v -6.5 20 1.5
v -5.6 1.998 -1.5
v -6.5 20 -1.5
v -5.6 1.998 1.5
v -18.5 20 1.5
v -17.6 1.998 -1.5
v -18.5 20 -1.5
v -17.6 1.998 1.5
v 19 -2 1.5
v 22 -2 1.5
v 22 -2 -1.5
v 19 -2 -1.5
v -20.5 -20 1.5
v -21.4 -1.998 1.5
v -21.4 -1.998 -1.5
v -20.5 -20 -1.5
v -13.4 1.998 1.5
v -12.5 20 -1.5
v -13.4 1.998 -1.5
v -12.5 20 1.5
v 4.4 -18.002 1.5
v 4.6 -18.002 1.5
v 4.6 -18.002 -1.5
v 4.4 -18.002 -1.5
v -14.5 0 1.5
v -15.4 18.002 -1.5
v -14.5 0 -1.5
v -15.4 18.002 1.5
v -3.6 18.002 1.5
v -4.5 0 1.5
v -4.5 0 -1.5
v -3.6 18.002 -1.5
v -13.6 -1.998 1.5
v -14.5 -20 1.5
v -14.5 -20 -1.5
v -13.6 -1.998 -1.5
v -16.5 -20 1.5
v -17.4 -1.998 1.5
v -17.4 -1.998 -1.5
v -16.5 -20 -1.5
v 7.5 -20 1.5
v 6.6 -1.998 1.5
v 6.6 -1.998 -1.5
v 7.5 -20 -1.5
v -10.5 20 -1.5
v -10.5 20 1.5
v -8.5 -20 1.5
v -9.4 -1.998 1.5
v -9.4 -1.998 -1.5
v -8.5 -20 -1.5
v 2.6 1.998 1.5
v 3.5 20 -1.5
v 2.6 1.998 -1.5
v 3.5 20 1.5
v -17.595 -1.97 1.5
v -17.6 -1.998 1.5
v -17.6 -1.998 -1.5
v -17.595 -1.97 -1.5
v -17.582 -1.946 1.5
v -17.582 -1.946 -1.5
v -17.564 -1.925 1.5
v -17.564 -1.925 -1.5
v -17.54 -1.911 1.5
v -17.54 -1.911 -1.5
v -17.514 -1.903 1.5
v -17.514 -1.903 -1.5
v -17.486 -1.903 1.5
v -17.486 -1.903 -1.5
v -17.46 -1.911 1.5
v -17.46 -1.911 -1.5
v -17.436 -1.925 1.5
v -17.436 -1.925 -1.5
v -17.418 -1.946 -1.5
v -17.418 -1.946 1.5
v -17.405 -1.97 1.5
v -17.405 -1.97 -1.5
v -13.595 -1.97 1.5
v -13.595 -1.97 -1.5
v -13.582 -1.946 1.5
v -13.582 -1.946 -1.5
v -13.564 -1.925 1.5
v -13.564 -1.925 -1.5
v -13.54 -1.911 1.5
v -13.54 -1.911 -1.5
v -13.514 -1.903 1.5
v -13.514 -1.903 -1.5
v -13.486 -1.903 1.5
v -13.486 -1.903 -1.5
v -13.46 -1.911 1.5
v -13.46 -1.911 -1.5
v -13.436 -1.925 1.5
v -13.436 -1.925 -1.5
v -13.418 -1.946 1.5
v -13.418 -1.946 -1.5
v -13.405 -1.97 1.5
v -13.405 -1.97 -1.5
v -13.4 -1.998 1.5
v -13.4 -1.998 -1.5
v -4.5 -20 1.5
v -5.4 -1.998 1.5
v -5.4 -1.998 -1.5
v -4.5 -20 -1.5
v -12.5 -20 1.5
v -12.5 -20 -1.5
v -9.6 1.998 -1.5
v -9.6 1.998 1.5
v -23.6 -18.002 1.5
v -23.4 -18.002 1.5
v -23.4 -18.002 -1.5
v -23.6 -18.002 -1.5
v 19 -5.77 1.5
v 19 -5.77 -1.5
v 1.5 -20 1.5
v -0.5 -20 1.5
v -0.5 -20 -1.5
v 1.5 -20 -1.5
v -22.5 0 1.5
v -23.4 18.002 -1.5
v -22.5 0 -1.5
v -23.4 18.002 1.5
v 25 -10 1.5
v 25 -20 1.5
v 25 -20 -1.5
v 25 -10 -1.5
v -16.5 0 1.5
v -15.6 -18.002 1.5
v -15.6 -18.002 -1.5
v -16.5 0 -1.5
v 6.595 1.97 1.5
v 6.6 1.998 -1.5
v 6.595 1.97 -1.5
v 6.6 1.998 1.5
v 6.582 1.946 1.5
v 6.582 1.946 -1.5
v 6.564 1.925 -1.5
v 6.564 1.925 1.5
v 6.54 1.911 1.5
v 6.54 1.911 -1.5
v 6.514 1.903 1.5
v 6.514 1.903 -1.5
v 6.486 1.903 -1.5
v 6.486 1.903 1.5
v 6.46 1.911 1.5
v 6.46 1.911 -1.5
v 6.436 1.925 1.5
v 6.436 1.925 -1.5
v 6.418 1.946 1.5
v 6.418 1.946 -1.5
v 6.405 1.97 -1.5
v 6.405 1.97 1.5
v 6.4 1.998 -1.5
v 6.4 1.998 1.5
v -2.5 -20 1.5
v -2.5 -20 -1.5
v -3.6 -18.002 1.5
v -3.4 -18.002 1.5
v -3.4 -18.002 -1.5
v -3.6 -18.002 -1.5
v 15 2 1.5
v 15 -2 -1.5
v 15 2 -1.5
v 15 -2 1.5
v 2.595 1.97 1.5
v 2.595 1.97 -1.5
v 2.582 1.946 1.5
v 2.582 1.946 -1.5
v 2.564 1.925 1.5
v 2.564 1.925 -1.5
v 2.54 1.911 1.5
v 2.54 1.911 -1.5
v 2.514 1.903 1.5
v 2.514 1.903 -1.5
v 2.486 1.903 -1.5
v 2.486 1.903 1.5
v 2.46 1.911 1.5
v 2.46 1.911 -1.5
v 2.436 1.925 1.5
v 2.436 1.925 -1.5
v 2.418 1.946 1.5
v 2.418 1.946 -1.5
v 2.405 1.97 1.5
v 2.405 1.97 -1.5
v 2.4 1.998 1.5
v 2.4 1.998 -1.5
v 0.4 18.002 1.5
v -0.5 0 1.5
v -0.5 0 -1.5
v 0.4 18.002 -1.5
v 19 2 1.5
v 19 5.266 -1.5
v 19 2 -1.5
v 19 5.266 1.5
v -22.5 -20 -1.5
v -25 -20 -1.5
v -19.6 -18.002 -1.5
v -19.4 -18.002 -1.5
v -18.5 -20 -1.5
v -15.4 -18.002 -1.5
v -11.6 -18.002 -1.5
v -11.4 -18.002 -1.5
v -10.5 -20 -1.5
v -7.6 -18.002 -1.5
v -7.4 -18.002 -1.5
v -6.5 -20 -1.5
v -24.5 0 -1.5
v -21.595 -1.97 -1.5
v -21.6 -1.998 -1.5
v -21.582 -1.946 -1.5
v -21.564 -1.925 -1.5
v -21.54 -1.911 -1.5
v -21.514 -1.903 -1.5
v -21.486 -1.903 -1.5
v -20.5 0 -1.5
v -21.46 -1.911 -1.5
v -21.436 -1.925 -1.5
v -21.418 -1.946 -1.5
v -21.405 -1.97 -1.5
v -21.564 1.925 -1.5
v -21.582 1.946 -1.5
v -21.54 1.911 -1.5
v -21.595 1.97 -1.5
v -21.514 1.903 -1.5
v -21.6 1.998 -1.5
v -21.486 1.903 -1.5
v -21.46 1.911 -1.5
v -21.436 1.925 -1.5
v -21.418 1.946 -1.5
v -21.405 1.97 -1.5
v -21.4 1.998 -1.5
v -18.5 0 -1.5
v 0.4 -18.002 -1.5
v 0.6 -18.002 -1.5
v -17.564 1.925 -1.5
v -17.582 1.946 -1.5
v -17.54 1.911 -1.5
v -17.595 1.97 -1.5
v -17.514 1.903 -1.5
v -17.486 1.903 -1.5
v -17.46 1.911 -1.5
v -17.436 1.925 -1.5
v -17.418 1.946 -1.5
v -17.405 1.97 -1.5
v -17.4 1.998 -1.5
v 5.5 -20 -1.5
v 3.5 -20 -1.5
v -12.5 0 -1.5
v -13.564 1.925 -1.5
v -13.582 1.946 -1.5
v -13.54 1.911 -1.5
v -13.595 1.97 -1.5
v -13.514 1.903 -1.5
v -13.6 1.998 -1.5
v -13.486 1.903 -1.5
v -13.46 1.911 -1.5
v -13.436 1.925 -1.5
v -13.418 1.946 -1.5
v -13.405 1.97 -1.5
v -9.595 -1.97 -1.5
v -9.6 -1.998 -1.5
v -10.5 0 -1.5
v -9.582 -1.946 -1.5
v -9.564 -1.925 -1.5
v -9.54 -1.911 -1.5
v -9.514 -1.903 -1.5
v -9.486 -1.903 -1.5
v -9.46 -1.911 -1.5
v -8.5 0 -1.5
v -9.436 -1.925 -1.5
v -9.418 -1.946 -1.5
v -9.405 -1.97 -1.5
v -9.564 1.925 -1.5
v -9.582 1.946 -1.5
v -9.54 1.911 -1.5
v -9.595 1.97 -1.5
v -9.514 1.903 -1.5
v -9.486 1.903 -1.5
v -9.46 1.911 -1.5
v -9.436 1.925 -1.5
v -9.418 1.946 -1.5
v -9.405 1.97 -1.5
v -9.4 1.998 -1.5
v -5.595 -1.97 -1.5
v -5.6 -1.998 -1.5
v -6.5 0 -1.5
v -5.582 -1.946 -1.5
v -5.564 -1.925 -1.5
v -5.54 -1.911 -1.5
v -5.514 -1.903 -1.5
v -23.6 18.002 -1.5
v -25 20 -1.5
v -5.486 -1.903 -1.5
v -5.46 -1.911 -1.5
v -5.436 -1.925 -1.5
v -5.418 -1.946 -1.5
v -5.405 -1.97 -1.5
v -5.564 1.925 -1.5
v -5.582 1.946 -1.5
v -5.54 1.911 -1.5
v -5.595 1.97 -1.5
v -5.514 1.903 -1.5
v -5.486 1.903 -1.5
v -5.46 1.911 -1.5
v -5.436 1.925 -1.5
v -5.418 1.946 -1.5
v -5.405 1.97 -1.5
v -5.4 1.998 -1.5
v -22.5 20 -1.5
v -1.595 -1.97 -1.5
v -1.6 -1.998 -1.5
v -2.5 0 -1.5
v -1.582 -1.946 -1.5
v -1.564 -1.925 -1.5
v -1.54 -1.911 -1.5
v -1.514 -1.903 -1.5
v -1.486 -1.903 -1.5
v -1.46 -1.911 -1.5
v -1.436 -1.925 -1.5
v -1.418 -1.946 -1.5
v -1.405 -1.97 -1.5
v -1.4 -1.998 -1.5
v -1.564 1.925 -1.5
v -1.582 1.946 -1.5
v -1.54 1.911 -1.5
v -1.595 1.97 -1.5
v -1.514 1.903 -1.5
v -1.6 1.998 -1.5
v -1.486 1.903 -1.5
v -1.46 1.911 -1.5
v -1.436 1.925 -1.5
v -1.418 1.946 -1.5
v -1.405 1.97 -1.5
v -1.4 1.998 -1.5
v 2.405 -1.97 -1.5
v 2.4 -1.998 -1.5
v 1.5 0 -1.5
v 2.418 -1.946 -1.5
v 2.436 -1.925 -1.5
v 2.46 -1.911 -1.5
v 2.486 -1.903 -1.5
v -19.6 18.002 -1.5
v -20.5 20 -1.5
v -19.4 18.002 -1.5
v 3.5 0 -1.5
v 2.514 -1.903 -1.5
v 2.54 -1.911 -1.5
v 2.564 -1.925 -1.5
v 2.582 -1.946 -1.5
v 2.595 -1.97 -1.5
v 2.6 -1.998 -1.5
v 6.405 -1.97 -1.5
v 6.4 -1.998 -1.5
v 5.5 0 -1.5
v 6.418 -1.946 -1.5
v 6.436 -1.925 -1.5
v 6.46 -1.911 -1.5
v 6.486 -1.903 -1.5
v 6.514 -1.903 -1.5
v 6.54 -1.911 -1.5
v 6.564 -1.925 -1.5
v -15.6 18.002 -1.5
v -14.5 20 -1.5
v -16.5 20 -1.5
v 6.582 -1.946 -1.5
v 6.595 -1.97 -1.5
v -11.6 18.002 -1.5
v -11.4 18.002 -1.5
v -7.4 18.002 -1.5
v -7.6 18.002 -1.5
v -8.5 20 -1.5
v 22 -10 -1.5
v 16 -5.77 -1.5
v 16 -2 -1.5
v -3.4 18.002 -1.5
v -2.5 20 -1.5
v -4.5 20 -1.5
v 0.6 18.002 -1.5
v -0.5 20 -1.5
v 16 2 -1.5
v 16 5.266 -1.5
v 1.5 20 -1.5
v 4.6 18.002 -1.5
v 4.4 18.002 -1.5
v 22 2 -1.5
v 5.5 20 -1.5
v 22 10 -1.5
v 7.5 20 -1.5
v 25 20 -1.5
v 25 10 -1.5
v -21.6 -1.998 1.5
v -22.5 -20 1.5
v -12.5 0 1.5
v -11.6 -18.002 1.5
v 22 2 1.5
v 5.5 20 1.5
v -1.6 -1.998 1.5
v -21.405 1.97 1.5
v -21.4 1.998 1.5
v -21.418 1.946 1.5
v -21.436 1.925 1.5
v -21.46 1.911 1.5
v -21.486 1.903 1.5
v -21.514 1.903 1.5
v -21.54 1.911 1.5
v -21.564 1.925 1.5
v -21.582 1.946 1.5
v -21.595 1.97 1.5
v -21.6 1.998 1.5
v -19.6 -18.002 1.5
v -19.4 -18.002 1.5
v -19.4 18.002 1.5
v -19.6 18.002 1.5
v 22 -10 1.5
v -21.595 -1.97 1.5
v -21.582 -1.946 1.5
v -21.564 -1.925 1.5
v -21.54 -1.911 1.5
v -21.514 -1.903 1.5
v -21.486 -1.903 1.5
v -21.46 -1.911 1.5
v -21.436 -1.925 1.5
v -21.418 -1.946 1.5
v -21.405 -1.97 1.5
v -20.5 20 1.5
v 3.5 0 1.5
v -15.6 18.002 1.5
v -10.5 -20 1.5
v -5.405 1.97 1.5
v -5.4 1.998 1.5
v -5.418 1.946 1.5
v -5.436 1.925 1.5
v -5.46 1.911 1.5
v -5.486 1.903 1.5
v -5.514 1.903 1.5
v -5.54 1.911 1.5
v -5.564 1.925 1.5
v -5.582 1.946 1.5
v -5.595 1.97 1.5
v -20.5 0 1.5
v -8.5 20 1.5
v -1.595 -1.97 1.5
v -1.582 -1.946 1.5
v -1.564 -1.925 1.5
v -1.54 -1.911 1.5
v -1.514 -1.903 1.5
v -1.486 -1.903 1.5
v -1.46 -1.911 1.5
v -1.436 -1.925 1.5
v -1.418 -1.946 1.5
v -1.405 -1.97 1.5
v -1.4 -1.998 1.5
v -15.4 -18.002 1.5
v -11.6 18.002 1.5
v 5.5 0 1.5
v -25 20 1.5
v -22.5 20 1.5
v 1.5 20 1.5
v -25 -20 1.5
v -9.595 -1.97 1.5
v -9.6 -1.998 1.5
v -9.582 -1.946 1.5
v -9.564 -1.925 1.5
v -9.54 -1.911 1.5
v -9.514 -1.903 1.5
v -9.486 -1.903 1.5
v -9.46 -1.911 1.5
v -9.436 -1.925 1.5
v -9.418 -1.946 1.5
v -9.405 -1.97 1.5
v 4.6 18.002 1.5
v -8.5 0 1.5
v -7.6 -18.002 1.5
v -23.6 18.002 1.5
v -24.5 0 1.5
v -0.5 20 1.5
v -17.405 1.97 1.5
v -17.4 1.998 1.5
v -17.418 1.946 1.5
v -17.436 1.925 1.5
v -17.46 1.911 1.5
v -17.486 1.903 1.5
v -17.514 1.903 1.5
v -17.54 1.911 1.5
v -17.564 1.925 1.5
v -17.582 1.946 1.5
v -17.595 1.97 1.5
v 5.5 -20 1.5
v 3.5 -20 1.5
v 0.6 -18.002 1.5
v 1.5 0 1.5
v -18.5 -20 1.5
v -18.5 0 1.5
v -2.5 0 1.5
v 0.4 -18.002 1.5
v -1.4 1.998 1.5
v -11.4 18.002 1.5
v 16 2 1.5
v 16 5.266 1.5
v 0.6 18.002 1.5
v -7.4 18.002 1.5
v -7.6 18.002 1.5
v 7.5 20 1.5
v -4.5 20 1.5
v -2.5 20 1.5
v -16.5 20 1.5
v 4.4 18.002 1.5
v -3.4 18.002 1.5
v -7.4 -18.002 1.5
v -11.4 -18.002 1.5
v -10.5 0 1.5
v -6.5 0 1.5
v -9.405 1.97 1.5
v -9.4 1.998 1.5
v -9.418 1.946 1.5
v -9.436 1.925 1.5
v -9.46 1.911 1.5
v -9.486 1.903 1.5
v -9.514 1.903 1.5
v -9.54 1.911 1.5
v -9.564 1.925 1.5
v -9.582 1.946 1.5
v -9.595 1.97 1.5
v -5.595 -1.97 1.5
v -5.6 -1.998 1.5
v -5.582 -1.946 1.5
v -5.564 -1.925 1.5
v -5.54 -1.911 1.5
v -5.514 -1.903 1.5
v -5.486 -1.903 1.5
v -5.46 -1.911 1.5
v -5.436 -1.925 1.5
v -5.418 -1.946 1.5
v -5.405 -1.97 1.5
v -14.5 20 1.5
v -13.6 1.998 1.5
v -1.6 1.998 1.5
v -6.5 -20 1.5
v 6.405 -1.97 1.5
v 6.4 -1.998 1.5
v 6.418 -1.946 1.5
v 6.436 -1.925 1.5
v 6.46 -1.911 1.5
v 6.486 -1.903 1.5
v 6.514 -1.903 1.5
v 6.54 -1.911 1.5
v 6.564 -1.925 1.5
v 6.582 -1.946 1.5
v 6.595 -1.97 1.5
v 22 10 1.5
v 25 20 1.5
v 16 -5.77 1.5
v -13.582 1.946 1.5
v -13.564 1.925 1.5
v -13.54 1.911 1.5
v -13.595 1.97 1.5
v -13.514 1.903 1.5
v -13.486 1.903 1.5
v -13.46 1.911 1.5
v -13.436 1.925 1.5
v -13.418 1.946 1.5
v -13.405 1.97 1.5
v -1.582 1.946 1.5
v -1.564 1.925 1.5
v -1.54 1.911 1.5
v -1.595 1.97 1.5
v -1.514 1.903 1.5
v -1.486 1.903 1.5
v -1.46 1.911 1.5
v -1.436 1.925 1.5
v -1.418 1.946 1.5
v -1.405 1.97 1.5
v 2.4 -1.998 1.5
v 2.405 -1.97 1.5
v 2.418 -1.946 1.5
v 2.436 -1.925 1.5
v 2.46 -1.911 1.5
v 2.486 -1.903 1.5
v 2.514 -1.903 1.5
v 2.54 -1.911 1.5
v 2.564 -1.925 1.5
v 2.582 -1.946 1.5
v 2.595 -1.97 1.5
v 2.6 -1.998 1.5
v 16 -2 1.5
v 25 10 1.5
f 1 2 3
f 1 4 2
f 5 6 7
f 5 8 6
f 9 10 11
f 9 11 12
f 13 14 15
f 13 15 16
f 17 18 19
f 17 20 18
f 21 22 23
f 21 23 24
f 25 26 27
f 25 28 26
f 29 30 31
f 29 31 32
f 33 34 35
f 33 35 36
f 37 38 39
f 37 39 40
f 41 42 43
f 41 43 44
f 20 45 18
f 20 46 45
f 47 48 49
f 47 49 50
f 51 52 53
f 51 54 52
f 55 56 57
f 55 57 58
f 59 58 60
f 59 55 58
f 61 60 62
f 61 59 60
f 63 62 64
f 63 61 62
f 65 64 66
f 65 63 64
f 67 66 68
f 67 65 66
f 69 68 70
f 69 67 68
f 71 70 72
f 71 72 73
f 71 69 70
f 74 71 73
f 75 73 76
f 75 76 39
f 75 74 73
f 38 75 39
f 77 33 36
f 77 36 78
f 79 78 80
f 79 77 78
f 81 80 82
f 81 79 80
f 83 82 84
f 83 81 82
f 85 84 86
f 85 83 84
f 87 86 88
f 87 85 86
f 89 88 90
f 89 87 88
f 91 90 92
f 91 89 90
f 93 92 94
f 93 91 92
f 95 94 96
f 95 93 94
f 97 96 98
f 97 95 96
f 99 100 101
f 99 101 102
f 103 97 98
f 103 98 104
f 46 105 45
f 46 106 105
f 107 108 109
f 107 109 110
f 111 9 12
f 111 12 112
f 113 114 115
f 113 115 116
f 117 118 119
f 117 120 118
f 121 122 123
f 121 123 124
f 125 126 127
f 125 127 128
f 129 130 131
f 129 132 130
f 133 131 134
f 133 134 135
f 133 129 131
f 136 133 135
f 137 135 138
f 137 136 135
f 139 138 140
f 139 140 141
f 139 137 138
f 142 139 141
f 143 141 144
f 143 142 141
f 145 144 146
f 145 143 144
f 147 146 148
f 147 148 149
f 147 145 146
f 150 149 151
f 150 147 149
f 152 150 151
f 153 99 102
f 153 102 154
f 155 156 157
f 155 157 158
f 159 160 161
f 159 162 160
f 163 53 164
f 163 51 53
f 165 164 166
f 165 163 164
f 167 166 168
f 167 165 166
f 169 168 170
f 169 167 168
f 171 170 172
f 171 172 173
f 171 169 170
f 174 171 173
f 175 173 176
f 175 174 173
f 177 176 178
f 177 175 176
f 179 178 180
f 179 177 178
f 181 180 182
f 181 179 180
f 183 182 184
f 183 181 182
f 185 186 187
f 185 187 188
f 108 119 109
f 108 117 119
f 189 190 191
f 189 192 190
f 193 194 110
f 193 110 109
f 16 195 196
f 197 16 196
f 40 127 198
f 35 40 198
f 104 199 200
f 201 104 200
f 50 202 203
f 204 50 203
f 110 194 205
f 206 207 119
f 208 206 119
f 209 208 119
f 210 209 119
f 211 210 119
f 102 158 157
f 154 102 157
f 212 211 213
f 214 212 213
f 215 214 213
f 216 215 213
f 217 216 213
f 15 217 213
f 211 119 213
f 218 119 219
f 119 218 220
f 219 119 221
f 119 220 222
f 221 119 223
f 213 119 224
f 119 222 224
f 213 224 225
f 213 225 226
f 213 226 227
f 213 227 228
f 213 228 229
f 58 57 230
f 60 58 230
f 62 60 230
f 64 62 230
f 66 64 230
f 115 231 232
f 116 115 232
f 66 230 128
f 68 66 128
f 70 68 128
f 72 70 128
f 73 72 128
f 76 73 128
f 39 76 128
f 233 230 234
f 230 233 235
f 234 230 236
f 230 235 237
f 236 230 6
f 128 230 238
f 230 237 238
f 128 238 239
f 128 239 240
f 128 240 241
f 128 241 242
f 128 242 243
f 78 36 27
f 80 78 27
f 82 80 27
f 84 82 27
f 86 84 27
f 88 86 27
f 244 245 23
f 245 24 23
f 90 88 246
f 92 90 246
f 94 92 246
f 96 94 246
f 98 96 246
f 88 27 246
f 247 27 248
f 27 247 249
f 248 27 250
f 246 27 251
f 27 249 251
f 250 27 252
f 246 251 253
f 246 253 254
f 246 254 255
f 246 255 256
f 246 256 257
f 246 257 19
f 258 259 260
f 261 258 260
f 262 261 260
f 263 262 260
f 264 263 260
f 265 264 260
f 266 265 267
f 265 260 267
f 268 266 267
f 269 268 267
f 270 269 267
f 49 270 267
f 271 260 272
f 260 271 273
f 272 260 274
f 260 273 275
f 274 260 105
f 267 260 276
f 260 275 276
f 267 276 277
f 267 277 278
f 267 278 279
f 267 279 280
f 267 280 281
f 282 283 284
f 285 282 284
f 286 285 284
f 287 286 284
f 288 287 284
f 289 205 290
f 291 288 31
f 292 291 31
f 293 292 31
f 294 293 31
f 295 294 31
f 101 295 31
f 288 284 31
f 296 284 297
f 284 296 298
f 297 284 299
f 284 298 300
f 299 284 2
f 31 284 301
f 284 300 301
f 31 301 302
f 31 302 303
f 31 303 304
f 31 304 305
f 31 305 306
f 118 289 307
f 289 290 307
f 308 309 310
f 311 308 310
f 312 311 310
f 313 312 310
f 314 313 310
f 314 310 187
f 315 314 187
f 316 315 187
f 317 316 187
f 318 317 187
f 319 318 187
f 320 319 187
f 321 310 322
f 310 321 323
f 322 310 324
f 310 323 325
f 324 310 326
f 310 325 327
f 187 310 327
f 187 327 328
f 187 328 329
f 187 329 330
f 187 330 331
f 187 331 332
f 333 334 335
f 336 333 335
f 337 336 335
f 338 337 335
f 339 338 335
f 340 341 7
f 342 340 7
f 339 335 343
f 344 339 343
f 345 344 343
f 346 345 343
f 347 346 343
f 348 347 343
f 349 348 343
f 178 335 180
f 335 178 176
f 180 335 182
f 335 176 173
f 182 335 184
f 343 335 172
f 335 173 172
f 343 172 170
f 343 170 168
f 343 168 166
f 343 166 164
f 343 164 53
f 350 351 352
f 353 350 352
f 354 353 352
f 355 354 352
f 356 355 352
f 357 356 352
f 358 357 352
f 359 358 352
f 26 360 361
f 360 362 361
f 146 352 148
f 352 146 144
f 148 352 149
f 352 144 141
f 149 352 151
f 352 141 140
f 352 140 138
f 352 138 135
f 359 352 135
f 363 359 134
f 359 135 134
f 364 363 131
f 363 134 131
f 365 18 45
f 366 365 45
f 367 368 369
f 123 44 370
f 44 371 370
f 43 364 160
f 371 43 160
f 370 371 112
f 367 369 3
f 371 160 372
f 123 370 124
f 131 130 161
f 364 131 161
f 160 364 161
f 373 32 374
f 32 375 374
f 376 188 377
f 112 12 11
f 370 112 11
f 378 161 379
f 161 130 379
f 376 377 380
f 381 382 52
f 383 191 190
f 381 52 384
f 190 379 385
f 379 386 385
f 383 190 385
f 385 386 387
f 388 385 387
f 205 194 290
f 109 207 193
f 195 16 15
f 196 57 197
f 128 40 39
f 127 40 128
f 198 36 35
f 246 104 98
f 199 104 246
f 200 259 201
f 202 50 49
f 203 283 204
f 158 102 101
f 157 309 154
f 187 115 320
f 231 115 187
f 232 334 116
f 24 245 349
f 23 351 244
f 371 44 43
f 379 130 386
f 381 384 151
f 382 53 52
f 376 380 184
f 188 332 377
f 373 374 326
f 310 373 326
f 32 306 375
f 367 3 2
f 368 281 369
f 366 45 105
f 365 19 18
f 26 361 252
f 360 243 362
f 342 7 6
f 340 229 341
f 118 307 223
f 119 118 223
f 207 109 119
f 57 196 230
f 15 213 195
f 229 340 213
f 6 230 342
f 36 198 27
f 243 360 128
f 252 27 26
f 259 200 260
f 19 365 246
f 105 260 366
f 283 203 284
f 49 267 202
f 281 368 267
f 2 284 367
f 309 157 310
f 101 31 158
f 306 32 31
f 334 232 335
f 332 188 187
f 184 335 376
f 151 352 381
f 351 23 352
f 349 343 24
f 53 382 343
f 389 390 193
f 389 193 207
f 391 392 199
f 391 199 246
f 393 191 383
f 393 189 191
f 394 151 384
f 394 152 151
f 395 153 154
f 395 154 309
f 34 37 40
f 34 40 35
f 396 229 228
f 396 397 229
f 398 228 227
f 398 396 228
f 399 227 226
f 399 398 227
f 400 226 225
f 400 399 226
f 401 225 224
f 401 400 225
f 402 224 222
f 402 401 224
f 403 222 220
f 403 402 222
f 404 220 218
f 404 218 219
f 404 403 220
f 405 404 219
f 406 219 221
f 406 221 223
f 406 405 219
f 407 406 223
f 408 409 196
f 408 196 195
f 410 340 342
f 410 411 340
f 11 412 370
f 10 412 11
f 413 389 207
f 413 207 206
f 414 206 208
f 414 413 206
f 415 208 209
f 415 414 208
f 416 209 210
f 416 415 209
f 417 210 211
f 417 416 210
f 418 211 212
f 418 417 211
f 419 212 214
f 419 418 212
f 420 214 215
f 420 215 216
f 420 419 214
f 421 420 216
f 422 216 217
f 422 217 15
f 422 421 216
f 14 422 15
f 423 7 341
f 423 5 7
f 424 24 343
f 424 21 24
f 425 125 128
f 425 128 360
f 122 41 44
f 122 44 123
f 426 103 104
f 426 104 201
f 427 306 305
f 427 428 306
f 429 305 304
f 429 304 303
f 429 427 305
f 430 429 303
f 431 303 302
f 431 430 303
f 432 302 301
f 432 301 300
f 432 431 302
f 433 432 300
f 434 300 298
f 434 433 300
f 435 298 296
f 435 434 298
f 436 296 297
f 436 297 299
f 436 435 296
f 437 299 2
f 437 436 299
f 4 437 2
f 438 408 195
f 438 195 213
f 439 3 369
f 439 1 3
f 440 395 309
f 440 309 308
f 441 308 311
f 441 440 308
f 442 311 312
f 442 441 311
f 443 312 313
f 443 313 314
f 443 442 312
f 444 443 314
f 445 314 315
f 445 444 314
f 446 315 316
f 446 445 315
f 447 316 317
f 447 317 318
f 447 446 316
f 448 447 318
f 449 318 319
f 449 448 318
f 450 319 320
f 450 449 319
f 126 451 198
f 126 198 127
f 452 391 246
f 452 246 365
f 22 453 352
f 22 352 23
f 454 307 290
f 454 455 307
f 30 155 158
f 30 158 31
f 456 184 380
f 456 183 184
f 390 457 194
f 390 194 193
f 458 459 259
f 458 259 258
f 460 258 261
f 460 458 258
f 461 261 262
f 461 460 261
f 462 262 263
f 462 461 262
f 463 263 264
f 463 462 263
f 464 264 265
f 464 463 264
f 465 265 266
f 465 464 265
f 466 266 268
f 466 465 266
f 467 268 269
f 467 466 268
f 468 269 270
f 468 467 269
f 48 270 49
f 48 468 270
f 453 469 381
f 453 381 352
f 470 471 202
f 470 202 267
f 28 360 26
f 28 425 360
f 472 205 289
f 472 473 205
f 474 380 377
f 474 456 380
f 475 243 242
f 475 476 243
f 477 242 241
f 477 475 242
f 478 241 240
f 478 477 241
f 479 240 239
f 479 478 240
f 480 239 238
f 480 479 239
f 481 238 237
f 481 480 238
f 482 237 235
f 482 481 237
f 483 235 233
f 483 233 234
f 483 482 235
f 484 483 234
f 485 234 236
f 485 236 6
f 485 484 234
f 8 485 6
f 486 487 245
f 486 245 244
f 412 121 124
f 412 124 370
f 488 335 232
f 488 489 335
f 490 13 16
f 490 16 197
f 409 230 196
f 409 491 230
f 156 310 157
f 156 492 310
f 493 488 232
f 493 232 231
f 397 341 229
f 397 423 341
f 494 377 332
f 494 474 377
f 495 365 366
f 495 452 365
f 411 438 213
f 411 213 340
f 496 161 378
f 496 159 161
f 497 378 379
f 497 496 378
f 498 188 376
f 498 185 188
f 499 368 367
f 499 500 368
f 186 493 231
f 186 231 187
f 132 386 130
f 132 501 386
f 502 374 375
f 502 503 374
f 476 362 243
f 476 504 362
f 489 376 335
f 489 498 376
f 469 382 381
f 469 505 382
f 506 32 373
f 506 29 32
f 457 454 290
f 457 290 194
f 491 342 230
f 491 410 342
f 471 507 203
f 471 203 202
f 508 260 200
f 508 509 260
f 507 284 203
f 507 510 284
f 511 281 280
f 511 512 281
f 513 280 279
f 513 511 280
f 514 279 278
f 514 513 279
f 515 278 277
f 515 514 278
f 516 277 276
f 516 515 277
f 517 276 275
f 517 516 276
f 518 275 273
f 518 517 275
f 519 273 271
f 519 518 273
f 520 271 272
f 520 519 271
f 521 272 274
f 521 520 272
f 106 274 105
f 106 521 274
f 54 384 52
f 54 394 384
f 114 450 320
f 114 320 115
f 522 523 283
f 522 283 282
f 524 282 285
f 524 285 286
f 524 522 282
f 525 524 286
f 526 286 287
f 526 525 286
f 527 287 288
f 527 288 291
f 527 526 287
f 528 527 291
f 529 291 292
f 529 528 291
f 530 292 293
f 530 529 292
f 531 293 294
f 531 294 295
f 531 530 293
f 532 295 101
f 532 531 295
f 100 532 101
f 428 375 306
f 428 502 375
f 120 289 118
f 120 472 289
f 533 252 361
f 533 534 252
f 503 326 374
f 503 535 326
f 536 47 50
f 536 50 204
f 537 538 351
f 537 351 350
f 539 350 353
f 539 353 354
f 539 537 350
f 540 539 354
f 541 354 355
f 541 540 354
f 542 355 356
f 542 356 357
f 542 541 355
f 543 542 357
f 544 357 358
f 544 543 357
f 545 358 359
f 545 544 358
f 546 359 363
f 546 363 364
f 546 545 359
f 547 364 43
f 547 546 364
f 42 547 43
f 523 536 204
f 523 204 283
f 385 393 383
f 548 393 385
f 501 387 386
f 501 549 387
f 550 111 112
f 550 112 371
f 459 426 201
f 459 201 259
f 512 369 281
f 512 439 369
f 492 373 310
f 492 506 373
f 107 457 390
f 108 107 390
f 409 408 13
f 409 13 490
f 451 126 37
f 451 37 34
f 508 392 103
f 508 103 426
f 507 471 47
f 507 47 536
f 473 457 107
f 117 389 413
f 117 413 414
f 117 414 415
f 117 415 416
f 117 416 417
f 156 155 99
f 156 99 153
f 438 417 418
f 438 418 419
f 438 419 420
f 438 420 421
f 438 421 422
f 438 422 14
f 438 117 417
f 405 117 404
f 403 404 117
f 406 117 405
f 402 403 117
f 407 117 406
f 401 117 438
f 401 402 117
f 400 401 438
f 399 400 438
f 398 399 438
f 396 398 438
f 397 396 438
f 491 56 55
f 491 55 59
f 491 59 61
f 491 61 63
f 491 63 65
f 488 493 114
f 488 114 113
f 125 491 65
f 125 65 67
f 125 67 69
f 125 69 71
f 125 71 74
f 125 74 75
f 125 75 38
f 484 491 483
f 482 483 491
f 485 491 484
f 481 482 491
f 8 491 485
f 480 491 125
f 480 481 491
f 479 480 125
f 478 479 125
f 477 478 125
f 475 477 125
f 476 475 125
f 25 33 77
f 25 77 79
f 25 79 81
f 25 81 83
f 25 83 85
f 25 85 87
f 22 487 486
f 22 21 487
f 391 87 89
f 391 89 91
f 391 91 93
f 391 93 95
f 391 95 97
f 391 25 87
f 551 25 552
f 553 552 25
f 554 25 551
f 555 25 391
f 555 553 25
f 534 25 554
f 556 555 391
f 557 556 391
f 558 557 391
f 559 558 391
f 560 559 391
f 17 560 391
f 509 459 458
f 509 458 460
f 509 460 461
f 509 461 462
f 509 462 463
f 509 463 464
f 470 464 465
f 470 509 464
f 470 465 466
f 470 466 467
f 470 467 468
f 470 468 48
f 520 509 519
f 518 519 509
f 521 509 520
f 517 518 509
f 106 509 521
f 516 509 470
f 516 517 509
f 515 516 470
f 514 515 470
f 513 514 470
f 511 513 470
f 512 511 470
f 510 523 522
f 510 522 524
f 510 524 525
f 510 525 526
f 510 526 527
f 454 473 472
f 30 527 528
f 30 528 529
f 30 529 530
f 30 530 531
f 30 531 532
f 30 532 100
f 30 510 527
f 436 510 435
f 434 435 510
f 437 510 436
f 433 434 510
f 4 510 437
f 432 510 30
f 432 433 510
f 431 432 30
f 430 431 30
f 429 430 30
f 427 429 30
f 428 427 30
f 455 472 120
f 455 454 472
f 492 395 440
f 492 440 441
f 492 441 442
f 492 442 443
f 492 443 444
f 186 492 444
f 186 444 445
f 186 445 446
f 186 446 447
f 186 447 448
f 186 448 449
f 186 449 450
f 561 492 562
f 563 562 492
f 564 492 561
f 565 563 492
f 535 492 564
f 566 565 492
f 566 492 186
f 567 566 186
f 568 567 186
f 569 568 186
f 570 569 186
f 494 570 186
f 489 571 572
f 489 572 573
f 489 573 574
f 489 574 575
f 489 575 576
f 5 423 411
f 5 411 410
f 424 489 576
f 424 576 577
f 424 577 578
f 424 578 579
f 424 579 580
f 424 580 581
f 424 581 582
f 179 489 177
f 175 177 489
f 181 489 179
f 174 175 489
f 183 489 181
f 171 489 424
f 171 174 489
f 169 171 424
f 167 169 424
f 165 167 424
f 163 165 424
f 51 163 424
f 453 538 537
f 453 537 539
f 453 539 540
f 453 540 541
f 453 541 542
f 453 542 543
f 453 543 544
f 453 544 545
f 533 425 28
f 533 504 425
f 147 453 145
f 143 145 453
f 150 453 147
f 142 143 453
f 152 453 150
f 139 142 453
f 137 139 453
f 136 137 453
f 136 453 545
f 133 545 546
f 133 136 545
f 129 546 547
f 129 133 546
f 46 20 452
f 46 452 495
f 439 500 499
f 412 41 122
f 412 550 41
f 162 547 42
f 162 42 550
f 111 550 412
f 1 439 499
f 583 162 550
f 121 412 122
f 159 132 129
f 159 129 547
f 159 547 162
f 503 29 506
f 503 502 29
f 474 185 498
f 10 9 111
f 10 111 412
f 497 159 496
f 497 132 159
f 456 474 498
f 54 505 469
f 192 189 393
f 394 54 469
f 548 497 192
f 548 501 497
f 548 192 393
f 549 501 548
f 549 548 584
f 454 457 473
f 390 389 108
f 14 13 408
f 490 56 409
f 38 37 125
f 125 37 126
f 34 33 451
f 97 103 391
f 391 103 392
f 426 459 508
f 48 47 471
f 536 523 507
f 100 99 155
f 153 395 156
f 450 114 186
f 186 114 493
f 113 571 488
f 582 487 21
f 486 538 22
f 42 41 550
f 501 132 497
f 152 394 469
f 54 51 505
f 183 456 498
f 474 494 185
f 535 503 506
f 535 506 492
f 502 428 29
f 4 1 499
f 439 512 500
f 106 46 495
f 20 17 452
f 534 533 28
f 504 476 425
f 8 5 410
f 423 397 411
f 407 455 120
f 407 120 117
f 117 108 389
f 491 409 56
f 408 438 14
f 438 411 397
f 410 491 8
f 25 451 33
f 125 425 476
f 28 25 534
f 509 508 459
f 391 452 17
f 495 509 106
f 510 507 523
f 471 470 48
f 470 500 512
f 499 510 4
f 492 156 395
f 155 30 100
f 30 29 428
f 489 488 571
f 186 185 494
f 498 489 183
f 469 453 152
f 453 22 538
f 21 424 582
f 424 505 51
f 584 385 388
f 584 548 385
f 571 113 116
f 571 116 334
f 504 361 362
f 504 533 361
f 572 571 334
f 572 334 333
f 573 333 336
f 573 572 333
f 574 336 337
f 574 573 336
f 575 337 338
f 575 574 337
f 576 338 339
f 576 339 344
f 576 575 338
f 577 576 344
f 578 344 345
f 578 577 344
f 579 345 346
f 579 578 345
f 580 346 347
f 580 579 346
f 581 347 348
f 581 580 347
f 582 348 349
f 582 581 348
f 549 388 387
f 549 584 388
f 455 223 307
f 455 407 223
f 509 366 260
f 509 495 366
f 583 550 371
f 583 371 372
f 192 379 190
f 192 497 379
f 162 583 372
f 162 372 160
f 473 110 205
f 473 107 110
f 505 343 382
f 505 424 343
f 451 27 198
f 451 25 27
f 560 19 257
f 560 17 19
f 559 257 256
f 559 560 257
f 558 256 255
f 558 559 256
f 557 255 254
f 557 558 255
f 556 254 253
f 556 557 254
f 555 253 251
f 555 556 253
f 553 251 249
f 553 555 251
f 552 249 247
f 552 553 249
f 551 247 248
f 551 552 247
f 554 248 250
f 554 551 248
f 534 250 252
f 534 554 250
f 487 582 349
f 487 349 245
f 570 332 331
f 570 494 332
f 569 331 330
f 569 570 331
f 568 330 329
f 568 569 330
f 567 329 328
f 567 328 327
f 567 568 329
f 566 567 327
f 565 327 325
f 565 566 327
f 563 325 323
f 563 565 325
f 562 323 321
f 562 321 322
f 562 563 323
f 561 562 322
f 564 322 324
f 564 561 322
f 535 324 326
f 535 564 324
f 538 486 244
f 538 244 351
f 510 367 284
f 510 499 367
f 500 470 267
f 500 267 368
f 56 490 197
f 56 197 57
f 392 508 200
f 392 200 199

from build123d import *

# Parameters (mm, degrees)
EXTRUDE_1_DEPTH = 1.5


with BuildPart() as part:
    # 草图1 → 凸台-拉伸1 (new body, symmetric)
    with BuildSketch(Plane.XY):
        with BuildLine():
            Line((-22.5, 20), (-25, 20))
            Line((-25, 20), (-25, -20))
            Line((-25, -20), (-22.5, -20))
            Line((-22.5, -20), (-21.599875234, -1.997504678))
            ThreePointArc((-21.599875234, -1.997504678), (-21.5, -1.902498439), (-21.400124766, -1.997504678))
            Line((-21.400124766, -1.997504678), (-20.5, -20))
            Line((-20.5, -20), (-18.5, -20))
            Line((-18.5, -20), (-17.599875234, -1.997504678))
            ThreePointArc((-17.599875234, -1.997504678), (-17.5, -1.902498439), (-17.400124766, -1.997504678))
            Line((-17.400124766, -1.997504678), (-16.5, -20))
            Line((-16.5, -20), (-14.5, -20))
            Line((-14.5, -20), (-13.599875234, -1.997504678))
            ThreePointArc((-13.599875234, -1.997504678), (-13.5, -1.902498439), (-13.400124766, -1.997504678))
            Line((-13.400124766, -1.997504678), (-12.5, -20))
            Line((-12.5, -20), (-10.5, -20))
            Line((-10.5, -20), (-9.599875234, -1.997504678))
            ThreePointArc((-9.599875234, -1.997504678), (-9.5, -1.902498439), (-9.400124766, -1.997504678))
            Line((-9.400124766, -1.997504678), (-8.5, -20))
            Line((-8.5, -20), (-6.5, -20))
            Line((-6.5, -20), (-5.599875234, -1.997504678))
            ThreePointArc((-5.599875234, -1.997504678), (-5.5, -1.902498439), (-5.400124766, -1.997504678))
            Line((-5.400124766, -1.997504678), (-4.5, -20))
            Line((-4.5, -20), (-2.5, -20))
            Line((-2.5, -20), (-1.599875234, -1.997504678))
            ThreePointArc((-1.599875234, -1.997504678), (-1.5, -1.902498439), (-1.400124766, -1.997504678))
            Line((-1.400124766, -1.997504678), (-0.5, -20))
            Line((-0.5, -20), (1.5, -20))
            Line((1.5, -20), (2.400124766, -1.997504678))
            ThreePointArc((2.400124766, -1.997504678), (2.5, -1.902498439), (2.599875234, -1.997504678))
            Line((2.599875234, -1.997504678), (3.5, -20))
            Line((3.5, -20), (5.5, -20))
            Line((5.5, -20), (6.400124766, -1.997504678))
            ThreePointArc((6.400124766, -1.997504678), (6.5, -1.902498439), (6.599875234, -1.997504678))
            Line((6.599875234, -1.997504678), (7.5, -20))
            Line((7.5, -20), (25, -20))
            Line((25, -20), (25, -10))
            Line((25, -10), (22, -10))
            Line((22, -10), (22, -2))
            Line((22, -2), (19, -2))
            Line((19, -2), (19, -5.769694942))
            Line((19, -5.769694942), (16, -5.769694942))
            Line((16, -5.769694942), (16, -2))
            Line((16, -2), (15, -2))
            Line((15, -2), (15, 2))
            Line((15, 2), (16, 2))
            Line((16, 2), (16, 5.265909841))
            Line((16, 5.265909841), (19, 5.265909841))
            Line((19, 5.265909841), (19, 2))
            Line((19, 2), (22, 2))
            Line((22, 2), (22, 10))
            Line((22, 10), (25, 10))
            Line((25, 10), (25, 20))
            Line((25, 20), (7.5, 20))
            Line((7.5, 20), (6.599875234, 1.997504678))
            ThreePointArc((6.599875234, 1.997504678), (6.5, 1.902498439), (6.400124766, 1.997504678))
            Line((6.400124766, 1.997504678), (5.5, 20))
            Line((5.5, 20), (3.5, 20))
            Line((3.5, 20), (2.599875234, 1.997504678))
            ThreePointArc((2.599875234, 1.997504678), (2.5, 1.902498439), (2.400124766, 1.997504678))
            Line((2.400124766, 1.997504678), (1.5, 20))
            Line((1.5, 20), (-0.5, 20))
            Line((-0.5, 20), (-1.400124766, 1.997504678))
            ThreePointArc((-1.400124766, 1.997504678), (-1.5, 1.902498439), (-1.599875234, 1.997504678))
            Line((-1.599875234, 1.997504678), (-2.5, 20))
            Line((-2.5, 20), (-4.5, 20))
            Line((-4.5, 20), (-5.400124766, 1.997504678))
            ThreePointArc((-5.400124766, 1.997504678), (-5.5, 1.902498439), (-5.599875234, 1.997504678))
            Line((-5.599875234, 1.997504678), (-6.5, 20))
            Line((-6.5, 20), (-8.5, 20))
            Line((-8.5, 20), (-9.400124766, 1.997504678))
            ThreePointArc((-9.400124766, 1.997504678), (-9.5, 1.902498439), (-9.599875234, 1.997504678))
            Line((-9.599875234, 1.997504678), (-10.5, 20))
            Line((-10.5, 20), (-12.5, 20))
            Line((-12.5, 20), (-13.400124766, 1.997504678))
            ThreePointArc((-13.400124766, 1.997504678), (-13.5, 1.902498439), (-13.599875234, 1.997504678))
            Line((-13.599875234, 1.997504678), (-14.5, 20))
            Line((-14.5, 20), (-16.5, 20))
            Line((-16.5, 20), (-17.400124766, 1.997504678))
            ThreePointArc((-17.400124766, 1.997504678), (-17.5, 1.902498439), (-17.599875234, 1.997504678))
            Line((-17.599875234, 1.997504678), (-18.5, 20))
            Line((-18.5, 20), (-20.5, 20))
            Line((-20.5, 20), (-21.400124766, 1.997504678))
            ThreePointArc((-21.400124766, 1.997504678), (-21.5, 1.902498439), (-21.599875234, 1.997504678))
            Line((-21.599875234, 1.997504678), (-22.5, 20))
        make_face()
        Polygon((4.599875234, 18.002495322), (5.5, 0), (4.599875234, -18.002495322), (4.400124766, -18.002495322), (3.5, 0), (4.400124766, 18.002495322), align=None, mode=Mode.SUBTRACT)
        Polygon((0.599875234, -18.002495322), (0.400124766, -18.002495322), (-0.5, 0), (0.400124766, 18.002495322), (0.599875234, 18.002495322), (1.5, 0), align=None, mode=Mode.SUBTRACT)
        Polygon((-3.400124766, -18.002495322), (-3.599875234, -18.002495322), (-4.5, 0), (-3.599875234, 18.002495322), (-3.400124766, 18.002495322), (-2.5, 0), align=None, mode=Mode.SUBTRACT)
        Polygon((-7.400124766, -18.002495322), (-7.599875234, -18.002495322), (-8.5, 0), (-7.599875234, 18.002495322), (-7.400124766, 18.002495322), (-6.5, 0), align=None, mode=Mode.SUBTRACT)
        Polygon((-11.400124766, -18.002495322), (-11.599875234, -18.002495322), (-12.5, 0), (-11.599875234, 18.002495322), (-11.400124766, 18.002495322), (-10.5, 0), align=None, mode=Mode.SUBTRACT)
        Polygon((-15.400124766, -18.002495322), (-15.599875234, -18.002495322), (-16.5, 0), (-15.599875234, 18.002495322), (-15.400124766, 18.002495322), (-14.5, 0), align=None, mode=Mode.SUBTRACT)
        Polygon((-19.400124766, -18.002495322), (-19.599875234, -18.002495322), (-20.5, 0), (-19.599875234, 18.002495322), (-19.400124766, 18.002495322), (-18.5, 0), align=None, mode=Mode.SUBTRACT)
        Polygon((-23.400124766, -18.002495322), (-23.599875234, -18.002495322), (-24.5, 0), (-23.599875234, 18.002495322), (-23.400124766, 18.002495322), (-22.5, 0), align=None, mode=Mode.SUBTRACT)
    extrude(amount=EXTRUDE_1_DEPTH, both=True)


solid = part.part
